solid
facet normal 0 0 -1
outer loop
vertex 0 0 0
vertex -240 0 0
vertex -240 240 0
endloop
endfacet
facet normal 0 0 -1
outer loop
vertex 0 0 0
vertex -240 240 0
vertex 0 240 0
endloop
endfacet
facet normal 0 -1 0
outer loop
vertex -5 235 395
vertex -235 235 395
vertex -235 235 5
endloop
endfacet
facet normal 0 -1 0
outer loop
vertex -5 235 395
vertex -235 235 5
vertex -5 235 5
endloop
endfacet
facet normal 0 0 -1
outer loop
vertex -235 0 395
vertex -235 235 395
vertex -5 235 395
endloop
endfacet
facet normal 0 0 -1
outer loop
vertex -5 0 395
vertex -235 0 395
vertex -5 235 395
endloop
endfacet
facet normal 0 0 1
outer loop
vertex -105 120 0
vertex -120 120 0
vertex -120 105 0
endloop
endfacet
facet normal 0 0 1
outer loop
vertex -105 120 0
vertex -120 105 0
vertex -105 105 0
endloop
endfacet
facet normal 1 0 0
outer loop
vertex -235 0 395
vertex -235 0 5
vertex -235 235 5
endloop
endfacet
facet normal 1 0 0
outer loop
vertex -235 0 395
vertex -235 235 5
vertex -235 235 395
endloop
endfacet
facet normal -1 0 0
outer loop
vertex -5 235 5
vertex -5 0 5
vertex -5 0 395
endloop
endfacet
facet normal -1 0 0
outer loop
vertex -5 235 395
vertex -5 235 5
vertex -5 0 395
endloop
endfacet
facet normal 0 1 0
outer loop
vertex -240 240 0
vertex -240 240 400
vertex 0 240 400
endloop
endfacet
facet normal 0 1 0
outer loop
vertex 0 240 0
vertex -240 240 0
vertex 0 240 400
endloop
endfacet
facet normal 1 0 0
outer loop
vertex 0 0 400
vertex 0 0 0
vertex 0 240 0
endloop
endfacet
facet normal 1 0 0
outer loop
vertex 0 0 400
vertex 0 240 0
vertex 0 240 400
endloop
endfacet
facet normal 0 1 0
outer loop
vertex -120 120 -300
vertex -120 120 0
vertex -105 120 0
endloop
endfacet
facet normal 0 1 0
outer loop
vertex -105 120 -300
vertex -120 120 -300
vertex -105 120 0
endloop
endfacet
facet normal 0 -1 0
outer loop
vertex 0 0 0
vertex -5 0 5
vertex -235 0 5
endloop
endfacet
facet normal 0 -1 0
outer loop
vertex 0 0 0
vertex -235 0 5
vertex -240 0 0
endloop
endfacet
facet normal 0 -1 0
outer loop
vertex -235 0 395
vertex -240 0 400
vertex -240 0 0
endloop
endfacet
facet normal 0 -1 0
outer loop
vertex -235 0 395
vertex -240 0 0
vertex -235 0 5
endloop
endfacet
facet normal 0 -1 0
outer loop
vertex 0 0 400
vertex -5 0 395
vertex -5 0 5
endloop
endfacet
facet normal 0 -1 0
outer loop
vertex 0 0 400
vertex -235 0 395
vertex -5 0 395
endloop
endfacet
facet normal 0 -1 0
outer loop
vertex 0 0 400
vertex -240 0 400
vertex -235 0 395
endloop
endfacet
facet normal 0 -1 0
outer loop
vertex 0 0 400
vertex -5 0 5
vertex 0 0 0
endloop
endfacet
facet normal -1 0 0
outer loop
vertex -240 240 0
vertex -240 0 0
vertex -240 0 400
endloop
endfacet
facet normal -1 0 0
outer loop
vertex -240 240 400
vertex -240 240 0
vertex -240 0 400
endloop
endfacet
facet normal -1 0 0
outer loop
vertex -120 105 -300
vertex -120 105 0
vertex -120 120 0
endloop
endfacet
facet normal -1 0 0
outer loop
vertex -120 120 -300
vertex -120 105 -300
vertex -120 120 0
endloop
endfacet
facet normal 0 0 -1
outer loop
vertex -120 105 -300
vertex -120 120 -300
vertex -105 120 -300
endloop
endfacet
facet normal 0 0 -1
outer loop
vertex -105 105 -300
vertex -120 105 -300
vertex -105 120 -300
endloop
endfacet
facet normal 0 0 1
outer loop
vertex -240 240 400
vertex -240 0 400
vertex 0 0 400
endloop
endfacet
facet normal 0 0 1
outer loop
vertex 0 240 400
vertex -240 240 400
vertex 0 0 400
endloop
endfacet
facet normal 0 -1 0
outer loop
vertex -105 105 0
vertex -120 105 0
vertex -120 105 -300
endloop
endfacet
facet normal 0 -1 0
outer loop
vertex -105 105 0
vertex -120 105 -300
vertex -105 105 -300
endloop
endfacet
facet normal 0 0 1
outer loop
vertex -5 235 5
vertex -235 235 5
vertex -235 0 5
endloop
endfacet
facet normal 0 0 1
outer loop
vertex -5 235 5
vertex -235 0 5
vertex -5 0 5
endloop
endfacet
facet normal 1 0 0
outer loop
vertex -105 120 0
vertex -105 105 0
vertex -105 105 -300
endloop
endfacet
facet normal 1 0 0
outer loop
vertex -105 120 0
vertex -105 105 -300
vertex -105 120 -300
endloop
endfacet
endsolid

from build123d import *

# Parameters (mm, degrees)
F0_W     = 240
F0_H     = 400
F1_DEPTH = 240
F2_T     = -5
F3_W     = 15
F3_H     = 15
F4_DEPTH = 300


with BuildPart() as f1:
    # F0 (on Front) → F1 (new body)
    with BuildSketch(Plane.XZ):
        with Locations((-120, 200)):
            Rectangle(F0_W, F0_H)
    extrude(amount=-F1_DEPTH)

    # F2
    f2_openings = [f1.faces().sort_by_distance(p)[0] for p in [
        (-120, 0, 200),
    ]]
    offset(amount=F2_T, openings=f2_openings)


with BuildPart() as f4:
    # F3 (on Top) → F4 (new body)
    with BuildSketch(Plane.XY):
        with Locations((-112.5, 112.5)):
            Rectangle(F3_W, F3_H)
    extrude(amount=-F4_DEPTH)


solid = Compound([f1.part, f4.part])
